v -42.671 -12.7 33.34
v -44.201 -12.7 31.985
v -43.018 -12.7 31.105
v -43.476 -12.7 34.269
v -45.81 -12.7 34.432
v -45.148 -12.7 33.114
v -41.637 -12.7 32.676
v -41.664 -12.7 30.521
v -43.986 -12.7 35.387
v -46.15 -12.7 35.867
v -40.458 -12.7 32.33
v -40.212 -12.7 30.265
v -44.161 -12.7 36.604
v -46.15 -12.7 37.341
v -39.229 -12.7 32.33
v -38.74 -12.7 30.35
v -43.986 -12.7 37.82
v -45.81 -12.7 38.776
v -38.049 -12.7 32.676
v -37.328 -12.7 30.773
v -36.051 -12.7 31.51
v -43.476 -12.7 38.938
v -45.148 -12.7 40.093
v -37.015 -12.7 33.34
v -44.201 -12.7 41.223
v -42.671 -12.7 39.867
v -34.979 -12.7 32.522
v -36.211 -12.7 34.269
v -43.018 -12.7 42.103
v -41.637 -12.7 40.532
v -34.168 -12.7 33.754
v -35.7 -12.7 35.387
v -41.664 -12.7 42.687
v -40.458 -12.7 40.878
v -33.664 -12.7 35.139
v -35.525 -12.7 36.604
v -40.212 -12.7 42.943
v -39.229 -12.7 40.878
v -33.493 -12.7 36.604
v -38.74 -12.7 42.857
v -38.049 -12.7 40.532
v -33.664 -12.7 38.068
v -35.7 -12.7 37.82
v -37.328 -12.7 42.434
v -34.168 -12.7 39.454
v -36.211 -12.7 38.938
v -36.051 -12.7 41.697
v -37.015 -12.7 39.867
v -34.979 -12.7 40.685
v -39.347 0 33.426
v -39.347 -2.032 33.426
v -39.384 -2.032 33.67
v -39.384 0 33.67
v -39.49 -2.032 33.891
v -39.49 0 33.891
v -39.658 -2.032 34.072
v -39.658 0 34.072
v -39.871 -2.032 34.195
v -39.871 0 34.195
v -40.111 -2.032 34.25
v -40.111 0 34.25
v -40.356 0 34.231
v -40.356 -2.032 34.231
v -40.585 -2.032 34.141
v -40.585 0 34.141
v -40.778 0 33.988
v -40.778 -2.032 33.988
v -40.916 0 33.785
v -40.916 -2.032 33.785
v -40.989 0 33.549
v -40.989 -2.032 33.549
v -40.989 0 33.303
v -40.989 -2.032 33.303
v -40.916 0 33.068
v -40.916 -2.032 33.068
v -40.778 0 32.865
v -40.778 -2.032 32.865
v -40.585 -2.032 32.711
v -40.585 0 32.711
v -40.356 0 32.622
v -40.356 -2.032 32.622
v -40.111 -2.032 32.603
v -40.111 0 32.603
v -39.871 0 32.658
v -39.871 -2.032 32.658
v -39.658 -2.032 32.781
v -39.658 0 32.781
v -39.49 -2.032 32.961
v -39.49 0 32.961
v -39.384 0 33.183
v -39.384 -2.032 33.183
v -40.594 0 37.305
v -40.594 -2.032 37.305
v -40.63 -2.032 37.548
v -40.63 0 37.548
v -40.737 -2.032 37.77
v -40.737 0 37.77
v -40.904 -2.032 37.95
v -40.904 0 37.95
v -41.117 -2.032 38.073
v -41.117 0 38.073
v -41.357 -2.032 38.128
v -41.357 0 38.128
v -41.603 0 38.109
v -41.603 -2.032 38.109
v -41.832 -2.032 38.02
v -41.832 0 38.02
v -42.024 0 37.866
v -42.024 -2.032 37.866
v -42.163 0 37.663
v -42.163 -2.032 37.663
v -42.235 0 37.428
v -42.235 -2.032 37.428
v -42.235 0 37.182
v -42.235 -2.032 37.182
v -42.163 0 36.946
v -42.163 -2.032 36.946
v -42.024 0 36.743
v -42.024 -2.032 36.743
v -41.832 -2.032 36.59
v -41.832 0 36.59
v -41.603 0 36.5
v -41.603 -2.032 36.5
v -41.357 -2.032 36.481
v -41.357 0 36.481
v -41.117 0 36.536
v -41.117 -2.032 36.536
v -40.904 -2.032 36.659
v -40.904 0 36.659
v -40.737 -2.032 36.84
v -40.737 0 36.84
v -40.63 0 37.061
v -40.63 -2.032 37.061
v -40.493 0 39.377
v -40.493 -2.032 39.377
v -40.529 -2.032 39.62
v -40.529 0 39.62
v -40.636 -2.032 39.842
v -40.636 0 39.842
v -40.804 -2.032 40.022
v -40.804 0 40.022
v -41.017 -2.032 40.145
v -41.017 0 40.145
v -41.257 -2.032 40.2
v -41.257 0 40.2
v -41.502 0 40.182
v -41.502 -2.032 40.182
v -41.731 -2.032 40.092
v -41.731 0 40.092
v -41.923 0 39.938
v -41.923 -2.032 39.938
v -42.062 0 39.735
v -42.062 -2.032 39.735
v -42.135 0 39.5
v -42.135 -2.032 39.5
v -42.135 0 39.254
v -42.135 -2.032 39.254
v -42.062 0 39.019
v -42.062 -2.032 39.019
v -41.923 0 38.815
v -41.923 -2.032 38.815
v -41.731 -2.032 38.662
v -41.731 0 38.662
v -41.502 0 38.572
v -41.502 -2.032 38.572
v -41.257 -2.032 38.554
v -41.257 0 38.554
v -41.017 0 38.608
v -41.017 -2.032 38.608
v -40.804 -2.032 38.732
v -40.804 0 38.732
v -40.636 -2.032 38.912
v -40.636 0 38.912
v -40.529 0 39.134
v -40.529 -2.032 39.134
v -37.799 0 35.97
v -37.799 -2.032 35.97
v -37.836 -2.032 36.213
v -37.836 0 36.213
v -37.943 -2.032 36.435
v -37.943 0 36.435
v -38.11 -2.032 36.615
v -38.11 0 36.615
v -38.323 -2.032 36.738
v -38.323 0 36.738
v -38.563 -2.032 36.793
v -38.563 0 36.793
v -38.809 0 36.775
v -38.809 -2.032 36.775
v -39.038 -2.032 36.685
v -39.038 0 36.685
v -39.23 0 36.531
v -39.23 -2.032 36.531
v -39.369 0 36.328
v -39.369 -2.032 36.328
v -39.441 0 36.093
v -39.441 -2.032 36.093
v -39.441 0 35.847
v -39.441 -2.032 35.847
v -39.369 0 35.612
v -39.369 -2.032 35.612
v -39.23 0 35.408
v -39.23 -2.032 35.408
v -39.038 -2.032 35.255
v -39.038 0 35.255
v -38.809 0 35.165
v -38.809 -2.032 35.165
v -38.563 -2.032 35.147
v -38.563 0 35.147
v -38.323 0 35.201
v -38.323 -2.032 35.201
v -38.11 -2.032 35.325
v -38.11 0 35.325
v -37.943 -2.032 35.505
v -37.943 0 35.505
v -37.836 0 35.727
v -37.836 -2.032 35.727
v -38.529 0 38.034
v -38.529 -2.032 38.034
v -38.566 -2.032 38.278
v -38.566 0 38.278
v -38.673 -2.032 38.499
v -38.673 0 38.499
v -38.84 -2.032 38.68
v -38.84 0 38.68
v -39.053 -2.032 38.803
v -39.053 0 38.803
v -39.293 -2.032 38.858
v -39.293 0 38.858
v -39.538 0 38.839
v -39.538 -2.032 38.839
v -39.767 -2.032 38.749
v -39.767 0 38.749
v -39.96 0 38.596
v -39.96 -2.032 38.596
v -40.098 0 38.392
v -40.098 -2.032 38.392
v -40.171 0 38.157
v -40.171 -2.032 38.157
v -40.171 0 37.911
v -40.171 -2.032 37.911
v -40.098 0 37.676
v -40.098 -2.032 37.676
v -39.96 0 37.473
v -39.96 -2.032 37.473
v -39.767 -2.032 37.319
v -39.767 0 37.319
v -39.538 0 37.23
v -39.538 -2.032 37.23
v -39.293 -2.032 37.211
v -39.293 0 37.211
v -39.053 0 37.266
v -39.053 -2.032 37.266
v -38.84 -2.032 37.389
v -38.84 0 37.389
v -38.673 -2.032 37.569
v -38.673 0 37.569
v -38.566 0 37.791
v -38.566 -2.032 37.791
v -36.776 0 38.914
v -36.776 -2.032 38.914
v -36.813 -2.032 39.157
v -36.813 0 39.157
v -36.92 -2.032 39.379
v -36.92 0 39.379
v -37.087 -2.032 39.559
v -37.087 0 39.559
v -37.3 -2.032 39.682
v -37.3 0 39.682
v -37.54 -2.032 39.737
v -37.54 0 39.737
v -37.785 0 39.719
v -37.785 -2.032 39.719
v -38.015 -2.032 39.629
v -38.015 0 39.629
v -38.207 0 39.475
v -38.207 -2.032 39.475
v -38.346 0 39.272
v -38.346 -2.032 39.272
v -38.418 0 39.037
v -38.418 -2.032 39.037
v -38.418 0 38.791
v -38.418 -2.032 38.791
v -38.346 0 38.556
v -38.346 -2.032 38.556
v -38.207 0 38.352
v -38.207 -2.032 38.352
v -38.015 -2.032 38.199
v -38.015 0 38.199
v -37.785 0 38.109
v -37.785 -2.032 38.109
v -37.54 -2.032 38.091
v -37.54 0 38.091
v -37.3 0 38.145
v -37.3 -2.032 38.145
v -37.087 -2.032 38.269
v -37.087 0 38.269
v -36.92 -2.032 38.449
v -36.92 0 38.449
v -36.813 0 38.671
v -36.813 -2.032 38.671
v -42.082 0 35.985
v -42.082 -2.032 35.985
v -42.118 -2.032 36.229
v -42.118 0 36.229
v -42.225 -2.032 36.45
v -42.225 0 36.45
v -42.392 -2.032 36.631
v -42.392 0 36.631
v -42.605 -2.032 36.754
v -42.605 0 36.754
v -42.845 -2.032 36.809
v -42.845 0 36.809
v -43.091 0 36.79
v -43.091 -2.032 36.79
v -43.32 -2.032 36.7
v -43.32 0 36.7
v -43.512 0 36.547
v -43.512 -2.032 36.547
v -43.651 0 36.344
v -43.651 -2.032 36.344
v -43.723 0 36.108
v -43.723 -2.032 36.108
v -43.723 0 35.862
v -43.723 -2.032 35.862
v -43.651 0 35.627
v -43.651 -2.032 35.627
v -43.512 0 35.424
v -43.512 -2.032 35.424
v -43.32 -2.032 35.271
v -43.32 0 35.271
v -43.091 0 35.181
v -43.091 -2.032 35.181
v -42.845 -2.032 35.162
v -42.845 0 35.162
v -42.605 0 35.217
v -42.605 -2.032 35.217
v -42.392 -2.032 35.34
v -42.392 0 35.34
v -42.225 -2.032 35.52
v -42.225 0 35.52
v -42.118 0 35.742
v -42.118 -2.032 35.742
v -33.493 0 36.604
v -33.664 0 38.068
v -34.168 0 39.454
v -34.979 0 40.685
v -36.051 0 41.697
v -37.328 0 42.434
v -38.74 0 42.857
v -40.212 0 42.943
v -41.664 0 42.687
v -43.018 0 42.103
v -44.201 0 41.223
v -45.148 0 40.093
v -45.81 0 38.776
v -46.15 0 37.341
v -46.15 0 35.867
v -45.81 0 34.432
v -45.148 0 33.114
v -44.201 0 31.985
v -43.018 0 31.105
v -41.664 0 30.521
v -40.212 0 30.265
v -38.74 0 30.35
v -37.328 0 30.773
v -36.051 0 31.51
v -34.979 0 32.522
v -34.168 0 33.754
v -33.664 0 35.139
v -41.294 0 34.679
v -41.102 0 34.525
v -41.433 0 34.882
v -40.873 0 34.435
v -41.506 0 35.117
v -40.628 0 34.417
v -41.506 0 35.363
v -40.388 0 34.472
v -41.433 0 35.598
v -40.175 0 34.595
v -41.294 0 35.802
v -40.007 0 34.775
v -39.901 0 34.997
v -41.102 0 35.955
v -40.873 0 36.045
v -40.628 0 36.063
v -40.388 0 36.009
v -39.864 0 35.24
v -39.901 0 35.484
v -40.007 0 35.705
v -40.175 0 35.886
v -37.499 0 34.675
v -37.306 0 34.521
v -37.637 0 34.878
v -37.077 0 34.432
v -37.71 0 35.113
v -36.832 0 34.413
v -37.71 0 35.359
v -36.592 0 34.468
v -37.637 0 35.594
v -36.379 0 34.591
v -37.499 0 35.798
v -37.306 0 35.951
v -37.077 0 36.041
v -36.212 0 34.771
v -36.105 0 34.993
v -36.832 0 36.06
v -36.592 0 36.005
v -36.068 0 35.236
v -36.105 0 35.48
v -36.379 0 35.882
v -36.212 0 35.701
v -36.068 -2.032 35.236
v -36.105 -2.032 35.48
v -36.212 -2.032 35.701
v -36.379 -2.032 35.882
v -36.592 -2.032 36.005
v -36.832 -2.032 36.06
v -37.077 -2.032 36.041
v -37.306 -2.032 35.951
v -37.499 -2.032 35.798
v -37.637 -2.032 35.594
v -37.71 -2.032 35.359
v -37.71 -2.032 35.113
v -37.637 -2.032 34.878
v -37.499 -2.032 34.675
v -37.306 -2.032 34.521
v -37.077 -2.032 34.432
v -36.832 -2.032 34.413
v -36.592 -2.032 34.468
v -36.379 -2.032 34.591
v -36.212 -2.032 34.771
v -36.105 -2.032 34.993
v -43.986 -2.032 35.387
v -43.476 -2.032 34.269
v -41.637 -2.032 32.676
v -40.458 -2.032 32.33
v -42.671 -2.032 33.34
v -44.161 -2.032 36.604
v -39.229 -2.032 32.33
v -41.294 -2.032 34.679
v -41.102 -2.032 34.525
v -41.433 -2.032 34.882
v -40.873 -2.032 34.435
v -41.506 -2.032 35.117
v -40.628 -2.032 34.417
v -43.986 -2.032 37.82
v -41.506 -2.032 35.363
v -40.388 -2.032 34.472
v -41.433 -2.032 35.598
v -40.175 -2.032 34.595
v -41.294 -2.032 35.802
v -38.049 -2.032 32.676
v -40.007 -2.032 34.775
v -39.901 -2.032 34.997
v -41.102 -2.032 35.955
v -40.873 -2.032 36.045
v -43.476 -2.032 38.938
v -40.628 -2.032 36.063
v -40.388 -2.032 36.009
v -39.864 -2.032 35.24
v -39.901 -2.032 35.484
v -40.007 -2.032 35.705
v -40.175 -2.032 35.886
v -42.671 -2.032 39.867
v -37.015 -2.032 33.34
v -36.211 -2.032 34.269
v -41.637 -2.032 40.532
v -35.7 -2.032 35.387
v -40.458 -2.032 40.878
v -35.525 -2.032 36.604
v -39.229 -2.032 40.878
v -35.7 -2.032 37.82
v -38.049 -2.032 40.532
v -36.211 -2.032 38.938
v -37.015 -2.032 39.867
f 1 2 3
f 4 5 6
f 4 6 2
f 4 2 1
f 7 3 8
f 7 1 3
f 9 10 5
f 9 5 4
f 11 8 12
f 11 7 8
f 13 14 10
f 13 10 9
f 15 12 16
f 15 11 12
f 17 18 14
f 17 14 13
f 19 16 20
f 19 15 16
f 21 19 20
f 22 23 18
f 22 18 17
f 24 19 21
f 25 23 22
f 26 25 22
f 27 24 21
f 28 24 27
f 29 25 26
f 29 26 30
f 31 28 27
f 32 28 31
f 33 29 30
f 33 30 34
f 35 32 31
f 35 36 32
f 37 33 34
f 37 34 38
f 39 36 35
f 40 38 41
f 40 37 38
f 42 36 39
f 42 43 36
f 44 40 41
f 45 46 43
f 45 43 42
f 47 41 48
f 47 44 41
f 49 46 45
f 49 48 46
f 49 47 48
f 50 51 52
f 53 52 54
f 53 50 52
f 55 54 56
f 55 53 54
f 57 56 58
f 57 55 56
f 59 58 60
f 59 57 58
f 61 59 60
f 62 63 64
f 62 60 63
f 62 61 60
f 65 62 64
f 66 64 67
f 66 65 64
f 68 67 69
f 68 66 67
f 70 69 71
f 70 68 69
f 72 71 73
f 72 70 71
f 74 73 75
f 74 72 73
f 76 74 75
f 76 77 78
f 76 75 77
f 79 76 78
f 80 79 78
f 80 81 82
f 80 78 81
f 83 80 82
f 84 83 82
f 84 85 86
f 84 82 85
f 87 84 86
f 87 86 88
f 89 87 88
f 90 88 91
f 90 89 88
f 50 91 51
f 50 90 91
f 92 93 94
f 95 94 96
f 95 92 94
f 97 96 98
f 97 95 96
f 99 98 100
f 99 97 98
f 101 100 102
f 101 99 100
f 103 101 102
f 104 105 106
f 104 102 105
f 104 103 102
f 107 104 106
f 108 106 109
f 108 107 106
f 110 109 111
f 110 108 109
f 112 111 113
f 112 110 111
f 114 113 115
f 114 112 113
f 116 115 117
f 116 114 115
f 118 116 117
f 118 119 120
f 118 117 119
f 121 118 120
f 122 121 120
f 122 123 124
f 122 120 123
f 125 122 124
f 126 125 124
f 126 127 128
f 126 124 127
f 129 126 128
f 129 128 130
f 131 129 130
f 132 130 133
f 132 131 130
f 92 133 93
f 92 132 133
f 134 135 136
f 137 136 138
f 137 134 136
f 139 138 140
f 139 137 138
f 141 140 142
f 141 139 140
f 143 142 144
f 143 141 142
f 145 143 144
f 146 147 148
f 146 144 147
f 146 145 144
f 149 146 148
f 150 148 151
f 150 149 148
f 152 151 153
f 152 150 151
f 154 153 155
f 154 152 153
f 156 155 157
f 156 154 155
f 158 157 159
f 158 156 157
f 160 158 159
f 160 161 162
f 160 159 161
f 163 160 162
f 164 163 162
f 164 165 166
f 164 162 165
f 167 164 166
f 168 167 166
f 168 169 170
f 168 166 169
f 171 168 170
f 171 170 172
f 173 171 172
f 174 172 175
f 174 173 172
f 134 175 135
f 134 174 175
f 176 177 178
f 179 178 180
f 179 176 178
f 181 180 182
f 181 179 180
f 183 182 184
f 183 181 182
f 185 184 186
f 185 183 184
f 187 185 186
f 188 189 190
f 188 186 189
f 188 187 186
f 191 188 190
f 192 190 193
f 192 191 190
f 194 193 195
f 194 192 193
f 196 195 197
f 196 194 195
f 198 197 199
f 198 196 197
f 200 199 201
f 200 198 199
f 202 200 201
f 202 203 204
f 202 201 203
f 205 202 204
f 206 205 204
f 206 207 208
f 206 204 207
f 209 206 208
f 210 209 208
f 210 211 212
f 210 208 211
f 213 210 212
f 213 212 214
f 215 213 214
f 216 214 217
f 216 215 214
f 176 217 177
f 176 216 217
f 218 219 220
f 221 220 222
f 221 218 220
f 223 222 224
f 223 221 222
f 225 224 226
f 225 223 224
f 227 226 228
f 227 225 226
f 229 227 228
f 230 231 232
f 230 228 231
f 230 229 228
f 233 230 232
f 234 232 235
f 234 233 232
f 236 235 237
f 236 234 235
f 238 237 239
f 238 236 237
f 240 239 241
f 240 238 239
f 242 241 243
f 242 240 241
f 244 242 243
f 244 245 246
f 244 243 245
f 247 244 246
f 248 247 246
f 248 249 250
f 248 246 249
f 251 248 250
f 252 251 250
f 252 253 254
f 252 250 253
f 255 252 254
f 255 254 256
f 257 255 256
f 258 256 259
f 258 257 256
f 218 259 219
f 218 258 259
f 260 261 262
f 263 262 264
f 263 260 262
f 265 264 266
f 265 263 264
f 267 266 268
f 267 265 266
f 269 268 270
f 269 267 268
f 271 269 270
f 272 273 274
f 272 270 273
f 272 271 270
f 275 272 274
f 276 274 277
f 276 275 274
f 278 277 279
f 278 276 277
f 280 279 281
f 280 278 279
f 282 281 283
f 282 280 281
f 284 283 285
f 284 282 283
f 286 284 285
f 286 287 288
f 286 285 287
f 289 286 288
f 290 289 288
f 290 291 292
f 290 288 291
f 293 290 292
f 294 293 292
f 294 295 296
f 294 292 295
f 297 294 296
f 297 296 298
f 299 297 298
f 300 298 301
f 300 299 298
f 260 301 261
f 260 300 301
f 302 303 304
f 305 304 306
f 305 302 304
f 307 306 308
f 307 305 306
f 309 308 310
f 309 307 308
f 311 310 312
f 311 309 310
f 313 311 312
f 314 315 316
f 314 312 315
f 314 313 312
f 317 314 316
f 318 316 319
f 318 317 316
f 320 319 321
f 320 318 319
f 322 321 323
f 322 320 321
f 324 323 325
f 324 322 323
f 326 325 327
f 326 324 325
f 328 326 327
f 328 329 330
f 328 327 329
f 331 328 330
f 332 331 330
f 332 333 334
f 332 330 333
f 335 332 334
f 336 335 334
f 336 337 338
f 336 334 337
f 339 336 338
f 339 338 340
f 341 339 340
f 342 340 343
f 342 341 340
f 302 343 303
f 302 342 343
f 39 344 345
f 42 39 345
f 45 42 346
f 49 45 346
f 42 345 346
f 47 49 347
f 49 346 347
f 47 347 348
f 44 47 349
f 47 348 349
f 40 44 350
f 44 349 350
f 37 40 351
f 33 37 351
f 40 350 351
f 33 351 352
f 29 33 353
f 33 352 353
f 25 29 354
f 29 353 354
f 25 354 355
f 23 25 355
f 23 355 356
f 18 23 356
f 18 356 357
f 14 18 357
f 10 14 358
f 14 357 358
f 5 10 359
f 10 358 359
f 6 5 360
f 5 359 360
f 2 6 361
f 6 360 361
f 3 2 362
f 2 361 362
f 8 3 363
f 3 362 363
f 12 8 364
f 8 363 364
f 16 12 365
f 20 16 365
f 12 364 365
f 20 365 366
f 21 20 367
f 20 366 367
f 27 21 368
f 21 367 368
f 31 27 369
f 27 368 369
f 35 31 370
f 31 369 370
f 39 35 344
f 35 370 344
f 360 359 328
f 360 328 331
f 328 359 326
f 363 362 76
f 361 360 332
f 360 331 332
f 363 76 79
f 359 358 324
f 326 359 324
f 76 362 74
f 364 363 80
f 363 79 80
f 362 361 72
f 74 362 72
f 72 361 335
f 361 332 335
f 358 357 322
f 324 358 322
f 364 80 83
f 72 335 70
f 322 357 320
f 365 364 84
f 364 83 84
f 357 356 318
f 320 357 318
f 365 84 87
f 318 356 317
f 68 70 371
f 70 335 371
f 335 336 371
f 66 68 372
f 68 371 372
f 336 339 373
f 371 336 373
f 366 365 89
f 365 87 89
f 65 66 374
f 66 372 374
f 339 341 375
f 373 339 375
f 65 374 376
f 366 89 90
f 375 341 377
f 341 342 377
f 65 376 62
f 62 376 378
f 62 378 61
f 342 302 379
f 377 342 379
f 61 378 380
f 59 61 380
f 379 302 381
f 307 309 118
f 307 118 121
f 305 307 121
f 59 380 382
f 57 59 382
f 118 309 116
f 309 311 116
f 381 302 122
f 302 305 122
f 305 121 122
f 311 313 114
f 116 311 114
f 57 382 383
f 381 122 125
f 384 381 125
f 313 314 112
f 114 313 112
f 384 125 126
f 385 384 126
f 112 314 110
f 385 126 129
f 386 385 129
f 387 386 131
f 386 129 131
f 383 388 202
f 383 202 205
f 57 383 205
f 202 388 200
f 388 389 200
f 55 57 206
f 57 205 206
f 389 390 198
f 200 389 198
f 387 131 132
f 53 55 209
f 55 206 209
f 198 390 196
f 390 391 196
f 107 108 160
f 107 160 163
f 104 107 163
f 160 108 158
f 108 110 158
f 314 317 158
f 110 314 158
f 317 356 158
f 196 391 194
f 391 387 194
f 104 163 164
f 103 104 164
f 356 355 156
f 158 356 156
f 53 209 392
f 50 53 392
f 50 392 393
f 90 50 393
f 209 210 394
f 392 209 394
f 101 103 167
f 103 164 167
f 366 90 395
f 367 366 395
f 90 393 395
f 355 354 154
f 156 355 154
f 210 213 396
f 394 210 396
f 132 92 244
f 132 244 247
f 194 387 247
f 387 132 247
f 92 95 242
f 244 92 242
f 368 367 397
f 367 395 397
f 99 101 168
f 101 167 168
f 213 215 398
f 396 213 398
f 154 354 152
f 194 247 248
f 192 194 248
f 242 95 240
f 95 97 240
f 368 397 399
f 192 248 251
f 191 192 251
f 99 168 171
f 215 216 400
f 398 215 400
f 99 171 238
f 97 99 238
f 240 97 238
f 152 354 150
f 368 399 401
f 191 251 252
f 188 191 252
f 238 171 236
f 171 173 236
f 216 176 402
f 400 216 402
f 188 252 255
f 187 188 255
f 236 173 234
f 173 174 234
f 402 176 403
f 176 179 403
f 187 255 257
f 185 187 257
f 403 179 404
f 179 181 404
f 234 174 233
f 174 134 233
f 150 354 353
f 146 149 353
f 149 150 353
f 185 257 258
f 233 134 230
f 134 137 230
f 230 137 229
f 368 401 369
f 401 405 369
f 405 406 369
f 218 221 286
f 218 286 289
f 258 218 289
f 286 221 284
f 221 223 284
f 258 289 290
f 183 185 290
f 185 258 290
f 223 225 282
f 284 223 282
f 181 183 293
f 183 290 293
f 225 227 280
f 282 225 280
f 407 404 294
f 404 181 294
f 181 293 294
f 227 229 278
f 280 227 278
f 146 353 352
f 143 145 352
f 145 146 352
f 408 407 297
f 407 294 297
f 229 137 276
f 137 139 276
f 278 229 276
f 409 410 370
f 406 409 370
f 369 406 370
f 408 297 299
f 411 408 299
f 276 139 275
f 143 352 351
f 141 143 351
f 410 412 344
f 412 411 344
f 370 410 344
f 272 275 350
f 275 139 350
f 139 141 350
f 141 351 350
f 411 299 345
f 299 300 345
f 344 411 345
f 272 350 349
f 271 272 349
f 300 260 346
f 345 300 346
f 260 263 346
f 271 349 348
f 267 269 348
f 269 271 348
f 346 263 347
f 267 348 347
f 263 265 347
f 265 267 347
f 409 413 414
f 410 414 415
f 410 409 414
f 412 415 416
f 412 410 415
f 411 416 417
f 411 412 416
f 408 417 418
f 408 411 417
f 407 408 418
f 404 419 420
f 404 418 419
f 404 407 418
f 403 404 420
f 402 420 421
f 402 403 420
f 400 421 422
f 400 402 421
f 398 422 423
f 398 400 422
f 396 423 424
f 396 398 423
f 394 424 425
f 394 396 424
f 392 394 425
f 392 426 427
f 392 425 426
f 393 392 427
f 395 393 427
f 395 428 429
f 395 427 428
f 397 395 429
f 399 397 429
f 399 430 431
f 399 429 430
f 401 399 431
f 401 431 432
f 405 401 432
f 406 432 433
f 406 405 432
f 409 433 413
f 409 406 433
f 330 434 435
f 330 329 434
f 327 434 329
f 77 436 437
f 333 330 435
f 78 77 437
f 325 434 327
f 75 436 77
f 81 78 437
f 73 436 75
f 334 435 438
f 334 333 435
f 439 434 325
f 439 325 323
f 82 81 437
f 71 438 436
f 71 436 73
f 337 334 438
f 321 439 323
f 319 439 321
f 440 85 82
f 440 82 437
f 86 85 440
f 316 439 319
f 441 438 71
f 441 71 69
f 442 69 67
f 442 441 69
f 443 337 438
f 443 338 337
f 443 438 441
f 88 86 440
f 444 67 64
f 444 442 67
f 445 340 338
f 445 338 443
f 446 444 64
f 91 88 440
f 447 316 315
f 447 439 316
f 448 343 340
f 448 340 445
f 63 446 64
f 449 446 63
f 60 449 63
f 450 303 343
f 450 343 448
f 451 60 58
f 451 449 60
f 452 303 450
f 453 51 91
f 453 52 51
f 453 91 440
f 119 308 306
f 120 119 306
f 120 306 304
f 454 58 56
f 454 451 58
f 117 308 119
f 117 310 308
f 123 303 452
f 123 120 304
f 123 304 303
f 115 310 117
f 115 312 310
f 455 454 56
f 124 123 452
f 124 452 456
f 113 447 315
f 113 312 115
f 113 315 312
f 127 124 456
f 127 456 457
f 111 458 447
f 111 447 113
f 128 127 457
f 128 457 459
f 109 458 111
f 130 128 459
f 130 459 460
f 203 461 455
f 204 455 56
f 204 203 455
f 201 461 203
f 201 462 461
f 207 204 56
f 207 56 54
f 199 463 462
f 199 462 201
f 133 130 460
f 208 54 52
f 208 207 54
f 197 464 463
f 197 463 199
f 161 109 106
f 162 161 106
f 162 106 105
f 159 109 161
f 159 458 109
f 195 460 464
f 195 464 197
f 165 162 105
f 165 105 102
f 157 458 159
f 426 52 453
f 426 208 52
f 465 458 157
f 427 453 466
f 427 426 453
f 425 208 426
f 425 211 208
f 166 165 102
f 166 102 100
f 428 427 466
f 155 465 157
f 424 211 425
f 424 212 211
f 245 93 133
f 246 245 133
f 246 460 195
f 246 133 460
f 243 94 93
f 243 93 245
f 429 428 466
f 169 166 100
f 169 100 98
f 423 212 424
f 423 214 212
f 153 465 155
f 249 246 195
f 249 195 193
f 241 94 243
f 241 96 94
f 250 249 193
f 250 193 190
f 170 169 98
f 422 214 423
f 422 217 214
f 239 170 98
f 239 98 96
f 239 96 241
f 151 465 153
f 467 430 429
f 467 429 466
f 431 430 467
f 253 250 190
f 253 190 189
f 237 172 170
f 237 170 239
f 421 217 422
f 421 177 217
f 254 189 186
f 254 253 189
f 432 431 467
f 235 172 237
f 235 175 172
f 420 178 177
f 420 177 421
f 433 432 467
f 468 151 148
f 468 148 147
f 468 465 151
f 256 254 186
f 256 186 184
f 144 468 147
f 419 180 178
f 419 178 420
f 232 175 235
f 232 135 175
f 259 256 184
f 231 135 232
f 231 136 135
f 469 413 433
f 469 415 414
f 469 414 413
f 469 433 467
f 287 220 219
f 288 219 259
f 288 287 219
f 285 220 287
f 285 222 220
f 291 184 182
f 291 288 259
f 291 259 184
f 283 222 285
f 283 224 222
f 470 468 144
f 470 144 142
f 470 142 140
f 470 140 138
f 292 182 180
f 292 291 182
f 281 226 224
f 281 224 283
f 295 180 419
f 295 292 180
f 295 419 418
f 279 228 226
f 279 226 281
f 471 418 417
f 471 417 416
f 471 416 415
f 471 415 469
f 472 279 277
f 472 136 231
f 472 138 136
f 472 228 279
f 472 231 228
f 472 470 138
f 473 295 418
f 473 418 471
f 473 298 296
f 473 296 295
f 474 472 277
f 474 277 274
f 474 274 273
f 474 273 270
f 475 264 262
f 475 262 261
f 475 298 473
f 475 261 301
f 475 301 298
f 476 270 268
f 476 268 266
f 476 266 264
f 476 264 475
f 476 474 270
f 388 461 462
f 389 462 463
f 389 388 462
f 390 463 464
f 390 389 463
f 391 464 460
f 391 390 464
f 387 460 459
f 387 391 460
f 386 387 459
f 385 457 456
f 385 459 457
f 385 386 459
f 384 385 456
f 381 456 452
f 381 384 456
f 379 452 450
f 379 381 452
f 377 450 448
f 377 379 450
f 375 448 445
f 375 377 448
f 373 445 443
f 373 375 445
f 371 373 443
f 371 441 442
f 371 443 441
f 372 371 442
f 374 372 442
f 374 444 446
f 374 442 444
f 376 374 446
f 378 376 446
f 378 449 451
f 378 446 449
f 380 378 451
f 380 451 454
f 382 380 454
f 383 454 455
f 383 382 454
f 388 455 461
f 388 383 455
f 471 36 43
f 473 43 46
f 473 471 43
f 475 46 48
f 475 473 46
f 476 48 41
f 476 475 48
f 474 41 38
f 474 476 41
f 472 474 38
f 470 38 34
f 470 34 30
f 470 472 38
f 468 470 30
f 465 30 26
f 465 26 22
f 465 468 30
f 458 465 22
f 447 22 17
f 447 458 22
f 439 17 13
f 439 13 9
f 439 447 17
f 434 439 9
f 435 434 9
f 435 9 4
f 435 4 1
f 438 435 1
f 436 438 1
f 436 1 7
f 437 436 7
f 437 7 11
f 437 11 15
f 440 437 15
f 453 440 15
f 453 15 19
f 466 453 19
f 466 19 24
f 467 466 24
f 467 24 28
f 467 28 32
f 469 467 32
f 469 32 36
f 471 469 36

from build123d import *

# Parameters (mm, degrees)
F0_R     = 6.35
F1_DEPTH = 12.7
F2_T     = -2.032
F3_R     = 0.8255
F4_DEPTH = 25.4
F5_R     = 0.8255
F6_DEPTH = 25.4


# Not quite as in the source:
# - a feature names something its author has since deleted; it is built from what else it names


with BuildPart() as f1:
    # F0 (on Front) → F1 (new body)
    with BuildSketch(Plane.XZ):
        with Locations((-39.8430377245, 36.6037674248)):
            Circle(F0_R)
    extrude(amount=F1_DEPTH)

    # F2
    f2_openings = [f1.faces().sort_by_distance(p)[0] for p in [
        (-39.843038, -12.7, 36.603767),
    ]]
    offset(amount=F2_T, openings=f2_openings)

    # F3 (on Front) → F4 (cut)
    with BuildSketch(Plane.XZ):
        with Locations((-40.1724703283, 33.4264033846)):
            Circle(F3_R)
        with Locations((-42.9070014867, 35.9854433805)):
            Circle(F3_R)
        with Locations((-41.3182264228, 39.3769239056)):
            Circle(F3_R)
        with Locations((-37.6017782744, 38.9139341465)):
            Circle(F3_R)
        with Locations((-36.8936620653, 35.2363102138)):
            Circle(F3_R)
    extrude(amount=F4_DEPTH, mode=Mode.SUBTRACT)

    # F5 (on Front) → F6 (cut)
    with BuildSketch(Plane.XZ):
        with Locations((-38.6249683797, 35.9699130058)):
            Circle(F5_R)
        with Locations((-39.3546639971, 38.0343095379)):
            Circle(F5_R)
        with Locations((-41.4190605292, 37.3046139206)):
            Circle(F5_R)
        with Locations((-40.6893649118, 35.2402173885)):
            Circle(F5_R)
    extrude(amount=F6_DEPTH, mode=Mode.SUBTRACT)


solid = f1.part
